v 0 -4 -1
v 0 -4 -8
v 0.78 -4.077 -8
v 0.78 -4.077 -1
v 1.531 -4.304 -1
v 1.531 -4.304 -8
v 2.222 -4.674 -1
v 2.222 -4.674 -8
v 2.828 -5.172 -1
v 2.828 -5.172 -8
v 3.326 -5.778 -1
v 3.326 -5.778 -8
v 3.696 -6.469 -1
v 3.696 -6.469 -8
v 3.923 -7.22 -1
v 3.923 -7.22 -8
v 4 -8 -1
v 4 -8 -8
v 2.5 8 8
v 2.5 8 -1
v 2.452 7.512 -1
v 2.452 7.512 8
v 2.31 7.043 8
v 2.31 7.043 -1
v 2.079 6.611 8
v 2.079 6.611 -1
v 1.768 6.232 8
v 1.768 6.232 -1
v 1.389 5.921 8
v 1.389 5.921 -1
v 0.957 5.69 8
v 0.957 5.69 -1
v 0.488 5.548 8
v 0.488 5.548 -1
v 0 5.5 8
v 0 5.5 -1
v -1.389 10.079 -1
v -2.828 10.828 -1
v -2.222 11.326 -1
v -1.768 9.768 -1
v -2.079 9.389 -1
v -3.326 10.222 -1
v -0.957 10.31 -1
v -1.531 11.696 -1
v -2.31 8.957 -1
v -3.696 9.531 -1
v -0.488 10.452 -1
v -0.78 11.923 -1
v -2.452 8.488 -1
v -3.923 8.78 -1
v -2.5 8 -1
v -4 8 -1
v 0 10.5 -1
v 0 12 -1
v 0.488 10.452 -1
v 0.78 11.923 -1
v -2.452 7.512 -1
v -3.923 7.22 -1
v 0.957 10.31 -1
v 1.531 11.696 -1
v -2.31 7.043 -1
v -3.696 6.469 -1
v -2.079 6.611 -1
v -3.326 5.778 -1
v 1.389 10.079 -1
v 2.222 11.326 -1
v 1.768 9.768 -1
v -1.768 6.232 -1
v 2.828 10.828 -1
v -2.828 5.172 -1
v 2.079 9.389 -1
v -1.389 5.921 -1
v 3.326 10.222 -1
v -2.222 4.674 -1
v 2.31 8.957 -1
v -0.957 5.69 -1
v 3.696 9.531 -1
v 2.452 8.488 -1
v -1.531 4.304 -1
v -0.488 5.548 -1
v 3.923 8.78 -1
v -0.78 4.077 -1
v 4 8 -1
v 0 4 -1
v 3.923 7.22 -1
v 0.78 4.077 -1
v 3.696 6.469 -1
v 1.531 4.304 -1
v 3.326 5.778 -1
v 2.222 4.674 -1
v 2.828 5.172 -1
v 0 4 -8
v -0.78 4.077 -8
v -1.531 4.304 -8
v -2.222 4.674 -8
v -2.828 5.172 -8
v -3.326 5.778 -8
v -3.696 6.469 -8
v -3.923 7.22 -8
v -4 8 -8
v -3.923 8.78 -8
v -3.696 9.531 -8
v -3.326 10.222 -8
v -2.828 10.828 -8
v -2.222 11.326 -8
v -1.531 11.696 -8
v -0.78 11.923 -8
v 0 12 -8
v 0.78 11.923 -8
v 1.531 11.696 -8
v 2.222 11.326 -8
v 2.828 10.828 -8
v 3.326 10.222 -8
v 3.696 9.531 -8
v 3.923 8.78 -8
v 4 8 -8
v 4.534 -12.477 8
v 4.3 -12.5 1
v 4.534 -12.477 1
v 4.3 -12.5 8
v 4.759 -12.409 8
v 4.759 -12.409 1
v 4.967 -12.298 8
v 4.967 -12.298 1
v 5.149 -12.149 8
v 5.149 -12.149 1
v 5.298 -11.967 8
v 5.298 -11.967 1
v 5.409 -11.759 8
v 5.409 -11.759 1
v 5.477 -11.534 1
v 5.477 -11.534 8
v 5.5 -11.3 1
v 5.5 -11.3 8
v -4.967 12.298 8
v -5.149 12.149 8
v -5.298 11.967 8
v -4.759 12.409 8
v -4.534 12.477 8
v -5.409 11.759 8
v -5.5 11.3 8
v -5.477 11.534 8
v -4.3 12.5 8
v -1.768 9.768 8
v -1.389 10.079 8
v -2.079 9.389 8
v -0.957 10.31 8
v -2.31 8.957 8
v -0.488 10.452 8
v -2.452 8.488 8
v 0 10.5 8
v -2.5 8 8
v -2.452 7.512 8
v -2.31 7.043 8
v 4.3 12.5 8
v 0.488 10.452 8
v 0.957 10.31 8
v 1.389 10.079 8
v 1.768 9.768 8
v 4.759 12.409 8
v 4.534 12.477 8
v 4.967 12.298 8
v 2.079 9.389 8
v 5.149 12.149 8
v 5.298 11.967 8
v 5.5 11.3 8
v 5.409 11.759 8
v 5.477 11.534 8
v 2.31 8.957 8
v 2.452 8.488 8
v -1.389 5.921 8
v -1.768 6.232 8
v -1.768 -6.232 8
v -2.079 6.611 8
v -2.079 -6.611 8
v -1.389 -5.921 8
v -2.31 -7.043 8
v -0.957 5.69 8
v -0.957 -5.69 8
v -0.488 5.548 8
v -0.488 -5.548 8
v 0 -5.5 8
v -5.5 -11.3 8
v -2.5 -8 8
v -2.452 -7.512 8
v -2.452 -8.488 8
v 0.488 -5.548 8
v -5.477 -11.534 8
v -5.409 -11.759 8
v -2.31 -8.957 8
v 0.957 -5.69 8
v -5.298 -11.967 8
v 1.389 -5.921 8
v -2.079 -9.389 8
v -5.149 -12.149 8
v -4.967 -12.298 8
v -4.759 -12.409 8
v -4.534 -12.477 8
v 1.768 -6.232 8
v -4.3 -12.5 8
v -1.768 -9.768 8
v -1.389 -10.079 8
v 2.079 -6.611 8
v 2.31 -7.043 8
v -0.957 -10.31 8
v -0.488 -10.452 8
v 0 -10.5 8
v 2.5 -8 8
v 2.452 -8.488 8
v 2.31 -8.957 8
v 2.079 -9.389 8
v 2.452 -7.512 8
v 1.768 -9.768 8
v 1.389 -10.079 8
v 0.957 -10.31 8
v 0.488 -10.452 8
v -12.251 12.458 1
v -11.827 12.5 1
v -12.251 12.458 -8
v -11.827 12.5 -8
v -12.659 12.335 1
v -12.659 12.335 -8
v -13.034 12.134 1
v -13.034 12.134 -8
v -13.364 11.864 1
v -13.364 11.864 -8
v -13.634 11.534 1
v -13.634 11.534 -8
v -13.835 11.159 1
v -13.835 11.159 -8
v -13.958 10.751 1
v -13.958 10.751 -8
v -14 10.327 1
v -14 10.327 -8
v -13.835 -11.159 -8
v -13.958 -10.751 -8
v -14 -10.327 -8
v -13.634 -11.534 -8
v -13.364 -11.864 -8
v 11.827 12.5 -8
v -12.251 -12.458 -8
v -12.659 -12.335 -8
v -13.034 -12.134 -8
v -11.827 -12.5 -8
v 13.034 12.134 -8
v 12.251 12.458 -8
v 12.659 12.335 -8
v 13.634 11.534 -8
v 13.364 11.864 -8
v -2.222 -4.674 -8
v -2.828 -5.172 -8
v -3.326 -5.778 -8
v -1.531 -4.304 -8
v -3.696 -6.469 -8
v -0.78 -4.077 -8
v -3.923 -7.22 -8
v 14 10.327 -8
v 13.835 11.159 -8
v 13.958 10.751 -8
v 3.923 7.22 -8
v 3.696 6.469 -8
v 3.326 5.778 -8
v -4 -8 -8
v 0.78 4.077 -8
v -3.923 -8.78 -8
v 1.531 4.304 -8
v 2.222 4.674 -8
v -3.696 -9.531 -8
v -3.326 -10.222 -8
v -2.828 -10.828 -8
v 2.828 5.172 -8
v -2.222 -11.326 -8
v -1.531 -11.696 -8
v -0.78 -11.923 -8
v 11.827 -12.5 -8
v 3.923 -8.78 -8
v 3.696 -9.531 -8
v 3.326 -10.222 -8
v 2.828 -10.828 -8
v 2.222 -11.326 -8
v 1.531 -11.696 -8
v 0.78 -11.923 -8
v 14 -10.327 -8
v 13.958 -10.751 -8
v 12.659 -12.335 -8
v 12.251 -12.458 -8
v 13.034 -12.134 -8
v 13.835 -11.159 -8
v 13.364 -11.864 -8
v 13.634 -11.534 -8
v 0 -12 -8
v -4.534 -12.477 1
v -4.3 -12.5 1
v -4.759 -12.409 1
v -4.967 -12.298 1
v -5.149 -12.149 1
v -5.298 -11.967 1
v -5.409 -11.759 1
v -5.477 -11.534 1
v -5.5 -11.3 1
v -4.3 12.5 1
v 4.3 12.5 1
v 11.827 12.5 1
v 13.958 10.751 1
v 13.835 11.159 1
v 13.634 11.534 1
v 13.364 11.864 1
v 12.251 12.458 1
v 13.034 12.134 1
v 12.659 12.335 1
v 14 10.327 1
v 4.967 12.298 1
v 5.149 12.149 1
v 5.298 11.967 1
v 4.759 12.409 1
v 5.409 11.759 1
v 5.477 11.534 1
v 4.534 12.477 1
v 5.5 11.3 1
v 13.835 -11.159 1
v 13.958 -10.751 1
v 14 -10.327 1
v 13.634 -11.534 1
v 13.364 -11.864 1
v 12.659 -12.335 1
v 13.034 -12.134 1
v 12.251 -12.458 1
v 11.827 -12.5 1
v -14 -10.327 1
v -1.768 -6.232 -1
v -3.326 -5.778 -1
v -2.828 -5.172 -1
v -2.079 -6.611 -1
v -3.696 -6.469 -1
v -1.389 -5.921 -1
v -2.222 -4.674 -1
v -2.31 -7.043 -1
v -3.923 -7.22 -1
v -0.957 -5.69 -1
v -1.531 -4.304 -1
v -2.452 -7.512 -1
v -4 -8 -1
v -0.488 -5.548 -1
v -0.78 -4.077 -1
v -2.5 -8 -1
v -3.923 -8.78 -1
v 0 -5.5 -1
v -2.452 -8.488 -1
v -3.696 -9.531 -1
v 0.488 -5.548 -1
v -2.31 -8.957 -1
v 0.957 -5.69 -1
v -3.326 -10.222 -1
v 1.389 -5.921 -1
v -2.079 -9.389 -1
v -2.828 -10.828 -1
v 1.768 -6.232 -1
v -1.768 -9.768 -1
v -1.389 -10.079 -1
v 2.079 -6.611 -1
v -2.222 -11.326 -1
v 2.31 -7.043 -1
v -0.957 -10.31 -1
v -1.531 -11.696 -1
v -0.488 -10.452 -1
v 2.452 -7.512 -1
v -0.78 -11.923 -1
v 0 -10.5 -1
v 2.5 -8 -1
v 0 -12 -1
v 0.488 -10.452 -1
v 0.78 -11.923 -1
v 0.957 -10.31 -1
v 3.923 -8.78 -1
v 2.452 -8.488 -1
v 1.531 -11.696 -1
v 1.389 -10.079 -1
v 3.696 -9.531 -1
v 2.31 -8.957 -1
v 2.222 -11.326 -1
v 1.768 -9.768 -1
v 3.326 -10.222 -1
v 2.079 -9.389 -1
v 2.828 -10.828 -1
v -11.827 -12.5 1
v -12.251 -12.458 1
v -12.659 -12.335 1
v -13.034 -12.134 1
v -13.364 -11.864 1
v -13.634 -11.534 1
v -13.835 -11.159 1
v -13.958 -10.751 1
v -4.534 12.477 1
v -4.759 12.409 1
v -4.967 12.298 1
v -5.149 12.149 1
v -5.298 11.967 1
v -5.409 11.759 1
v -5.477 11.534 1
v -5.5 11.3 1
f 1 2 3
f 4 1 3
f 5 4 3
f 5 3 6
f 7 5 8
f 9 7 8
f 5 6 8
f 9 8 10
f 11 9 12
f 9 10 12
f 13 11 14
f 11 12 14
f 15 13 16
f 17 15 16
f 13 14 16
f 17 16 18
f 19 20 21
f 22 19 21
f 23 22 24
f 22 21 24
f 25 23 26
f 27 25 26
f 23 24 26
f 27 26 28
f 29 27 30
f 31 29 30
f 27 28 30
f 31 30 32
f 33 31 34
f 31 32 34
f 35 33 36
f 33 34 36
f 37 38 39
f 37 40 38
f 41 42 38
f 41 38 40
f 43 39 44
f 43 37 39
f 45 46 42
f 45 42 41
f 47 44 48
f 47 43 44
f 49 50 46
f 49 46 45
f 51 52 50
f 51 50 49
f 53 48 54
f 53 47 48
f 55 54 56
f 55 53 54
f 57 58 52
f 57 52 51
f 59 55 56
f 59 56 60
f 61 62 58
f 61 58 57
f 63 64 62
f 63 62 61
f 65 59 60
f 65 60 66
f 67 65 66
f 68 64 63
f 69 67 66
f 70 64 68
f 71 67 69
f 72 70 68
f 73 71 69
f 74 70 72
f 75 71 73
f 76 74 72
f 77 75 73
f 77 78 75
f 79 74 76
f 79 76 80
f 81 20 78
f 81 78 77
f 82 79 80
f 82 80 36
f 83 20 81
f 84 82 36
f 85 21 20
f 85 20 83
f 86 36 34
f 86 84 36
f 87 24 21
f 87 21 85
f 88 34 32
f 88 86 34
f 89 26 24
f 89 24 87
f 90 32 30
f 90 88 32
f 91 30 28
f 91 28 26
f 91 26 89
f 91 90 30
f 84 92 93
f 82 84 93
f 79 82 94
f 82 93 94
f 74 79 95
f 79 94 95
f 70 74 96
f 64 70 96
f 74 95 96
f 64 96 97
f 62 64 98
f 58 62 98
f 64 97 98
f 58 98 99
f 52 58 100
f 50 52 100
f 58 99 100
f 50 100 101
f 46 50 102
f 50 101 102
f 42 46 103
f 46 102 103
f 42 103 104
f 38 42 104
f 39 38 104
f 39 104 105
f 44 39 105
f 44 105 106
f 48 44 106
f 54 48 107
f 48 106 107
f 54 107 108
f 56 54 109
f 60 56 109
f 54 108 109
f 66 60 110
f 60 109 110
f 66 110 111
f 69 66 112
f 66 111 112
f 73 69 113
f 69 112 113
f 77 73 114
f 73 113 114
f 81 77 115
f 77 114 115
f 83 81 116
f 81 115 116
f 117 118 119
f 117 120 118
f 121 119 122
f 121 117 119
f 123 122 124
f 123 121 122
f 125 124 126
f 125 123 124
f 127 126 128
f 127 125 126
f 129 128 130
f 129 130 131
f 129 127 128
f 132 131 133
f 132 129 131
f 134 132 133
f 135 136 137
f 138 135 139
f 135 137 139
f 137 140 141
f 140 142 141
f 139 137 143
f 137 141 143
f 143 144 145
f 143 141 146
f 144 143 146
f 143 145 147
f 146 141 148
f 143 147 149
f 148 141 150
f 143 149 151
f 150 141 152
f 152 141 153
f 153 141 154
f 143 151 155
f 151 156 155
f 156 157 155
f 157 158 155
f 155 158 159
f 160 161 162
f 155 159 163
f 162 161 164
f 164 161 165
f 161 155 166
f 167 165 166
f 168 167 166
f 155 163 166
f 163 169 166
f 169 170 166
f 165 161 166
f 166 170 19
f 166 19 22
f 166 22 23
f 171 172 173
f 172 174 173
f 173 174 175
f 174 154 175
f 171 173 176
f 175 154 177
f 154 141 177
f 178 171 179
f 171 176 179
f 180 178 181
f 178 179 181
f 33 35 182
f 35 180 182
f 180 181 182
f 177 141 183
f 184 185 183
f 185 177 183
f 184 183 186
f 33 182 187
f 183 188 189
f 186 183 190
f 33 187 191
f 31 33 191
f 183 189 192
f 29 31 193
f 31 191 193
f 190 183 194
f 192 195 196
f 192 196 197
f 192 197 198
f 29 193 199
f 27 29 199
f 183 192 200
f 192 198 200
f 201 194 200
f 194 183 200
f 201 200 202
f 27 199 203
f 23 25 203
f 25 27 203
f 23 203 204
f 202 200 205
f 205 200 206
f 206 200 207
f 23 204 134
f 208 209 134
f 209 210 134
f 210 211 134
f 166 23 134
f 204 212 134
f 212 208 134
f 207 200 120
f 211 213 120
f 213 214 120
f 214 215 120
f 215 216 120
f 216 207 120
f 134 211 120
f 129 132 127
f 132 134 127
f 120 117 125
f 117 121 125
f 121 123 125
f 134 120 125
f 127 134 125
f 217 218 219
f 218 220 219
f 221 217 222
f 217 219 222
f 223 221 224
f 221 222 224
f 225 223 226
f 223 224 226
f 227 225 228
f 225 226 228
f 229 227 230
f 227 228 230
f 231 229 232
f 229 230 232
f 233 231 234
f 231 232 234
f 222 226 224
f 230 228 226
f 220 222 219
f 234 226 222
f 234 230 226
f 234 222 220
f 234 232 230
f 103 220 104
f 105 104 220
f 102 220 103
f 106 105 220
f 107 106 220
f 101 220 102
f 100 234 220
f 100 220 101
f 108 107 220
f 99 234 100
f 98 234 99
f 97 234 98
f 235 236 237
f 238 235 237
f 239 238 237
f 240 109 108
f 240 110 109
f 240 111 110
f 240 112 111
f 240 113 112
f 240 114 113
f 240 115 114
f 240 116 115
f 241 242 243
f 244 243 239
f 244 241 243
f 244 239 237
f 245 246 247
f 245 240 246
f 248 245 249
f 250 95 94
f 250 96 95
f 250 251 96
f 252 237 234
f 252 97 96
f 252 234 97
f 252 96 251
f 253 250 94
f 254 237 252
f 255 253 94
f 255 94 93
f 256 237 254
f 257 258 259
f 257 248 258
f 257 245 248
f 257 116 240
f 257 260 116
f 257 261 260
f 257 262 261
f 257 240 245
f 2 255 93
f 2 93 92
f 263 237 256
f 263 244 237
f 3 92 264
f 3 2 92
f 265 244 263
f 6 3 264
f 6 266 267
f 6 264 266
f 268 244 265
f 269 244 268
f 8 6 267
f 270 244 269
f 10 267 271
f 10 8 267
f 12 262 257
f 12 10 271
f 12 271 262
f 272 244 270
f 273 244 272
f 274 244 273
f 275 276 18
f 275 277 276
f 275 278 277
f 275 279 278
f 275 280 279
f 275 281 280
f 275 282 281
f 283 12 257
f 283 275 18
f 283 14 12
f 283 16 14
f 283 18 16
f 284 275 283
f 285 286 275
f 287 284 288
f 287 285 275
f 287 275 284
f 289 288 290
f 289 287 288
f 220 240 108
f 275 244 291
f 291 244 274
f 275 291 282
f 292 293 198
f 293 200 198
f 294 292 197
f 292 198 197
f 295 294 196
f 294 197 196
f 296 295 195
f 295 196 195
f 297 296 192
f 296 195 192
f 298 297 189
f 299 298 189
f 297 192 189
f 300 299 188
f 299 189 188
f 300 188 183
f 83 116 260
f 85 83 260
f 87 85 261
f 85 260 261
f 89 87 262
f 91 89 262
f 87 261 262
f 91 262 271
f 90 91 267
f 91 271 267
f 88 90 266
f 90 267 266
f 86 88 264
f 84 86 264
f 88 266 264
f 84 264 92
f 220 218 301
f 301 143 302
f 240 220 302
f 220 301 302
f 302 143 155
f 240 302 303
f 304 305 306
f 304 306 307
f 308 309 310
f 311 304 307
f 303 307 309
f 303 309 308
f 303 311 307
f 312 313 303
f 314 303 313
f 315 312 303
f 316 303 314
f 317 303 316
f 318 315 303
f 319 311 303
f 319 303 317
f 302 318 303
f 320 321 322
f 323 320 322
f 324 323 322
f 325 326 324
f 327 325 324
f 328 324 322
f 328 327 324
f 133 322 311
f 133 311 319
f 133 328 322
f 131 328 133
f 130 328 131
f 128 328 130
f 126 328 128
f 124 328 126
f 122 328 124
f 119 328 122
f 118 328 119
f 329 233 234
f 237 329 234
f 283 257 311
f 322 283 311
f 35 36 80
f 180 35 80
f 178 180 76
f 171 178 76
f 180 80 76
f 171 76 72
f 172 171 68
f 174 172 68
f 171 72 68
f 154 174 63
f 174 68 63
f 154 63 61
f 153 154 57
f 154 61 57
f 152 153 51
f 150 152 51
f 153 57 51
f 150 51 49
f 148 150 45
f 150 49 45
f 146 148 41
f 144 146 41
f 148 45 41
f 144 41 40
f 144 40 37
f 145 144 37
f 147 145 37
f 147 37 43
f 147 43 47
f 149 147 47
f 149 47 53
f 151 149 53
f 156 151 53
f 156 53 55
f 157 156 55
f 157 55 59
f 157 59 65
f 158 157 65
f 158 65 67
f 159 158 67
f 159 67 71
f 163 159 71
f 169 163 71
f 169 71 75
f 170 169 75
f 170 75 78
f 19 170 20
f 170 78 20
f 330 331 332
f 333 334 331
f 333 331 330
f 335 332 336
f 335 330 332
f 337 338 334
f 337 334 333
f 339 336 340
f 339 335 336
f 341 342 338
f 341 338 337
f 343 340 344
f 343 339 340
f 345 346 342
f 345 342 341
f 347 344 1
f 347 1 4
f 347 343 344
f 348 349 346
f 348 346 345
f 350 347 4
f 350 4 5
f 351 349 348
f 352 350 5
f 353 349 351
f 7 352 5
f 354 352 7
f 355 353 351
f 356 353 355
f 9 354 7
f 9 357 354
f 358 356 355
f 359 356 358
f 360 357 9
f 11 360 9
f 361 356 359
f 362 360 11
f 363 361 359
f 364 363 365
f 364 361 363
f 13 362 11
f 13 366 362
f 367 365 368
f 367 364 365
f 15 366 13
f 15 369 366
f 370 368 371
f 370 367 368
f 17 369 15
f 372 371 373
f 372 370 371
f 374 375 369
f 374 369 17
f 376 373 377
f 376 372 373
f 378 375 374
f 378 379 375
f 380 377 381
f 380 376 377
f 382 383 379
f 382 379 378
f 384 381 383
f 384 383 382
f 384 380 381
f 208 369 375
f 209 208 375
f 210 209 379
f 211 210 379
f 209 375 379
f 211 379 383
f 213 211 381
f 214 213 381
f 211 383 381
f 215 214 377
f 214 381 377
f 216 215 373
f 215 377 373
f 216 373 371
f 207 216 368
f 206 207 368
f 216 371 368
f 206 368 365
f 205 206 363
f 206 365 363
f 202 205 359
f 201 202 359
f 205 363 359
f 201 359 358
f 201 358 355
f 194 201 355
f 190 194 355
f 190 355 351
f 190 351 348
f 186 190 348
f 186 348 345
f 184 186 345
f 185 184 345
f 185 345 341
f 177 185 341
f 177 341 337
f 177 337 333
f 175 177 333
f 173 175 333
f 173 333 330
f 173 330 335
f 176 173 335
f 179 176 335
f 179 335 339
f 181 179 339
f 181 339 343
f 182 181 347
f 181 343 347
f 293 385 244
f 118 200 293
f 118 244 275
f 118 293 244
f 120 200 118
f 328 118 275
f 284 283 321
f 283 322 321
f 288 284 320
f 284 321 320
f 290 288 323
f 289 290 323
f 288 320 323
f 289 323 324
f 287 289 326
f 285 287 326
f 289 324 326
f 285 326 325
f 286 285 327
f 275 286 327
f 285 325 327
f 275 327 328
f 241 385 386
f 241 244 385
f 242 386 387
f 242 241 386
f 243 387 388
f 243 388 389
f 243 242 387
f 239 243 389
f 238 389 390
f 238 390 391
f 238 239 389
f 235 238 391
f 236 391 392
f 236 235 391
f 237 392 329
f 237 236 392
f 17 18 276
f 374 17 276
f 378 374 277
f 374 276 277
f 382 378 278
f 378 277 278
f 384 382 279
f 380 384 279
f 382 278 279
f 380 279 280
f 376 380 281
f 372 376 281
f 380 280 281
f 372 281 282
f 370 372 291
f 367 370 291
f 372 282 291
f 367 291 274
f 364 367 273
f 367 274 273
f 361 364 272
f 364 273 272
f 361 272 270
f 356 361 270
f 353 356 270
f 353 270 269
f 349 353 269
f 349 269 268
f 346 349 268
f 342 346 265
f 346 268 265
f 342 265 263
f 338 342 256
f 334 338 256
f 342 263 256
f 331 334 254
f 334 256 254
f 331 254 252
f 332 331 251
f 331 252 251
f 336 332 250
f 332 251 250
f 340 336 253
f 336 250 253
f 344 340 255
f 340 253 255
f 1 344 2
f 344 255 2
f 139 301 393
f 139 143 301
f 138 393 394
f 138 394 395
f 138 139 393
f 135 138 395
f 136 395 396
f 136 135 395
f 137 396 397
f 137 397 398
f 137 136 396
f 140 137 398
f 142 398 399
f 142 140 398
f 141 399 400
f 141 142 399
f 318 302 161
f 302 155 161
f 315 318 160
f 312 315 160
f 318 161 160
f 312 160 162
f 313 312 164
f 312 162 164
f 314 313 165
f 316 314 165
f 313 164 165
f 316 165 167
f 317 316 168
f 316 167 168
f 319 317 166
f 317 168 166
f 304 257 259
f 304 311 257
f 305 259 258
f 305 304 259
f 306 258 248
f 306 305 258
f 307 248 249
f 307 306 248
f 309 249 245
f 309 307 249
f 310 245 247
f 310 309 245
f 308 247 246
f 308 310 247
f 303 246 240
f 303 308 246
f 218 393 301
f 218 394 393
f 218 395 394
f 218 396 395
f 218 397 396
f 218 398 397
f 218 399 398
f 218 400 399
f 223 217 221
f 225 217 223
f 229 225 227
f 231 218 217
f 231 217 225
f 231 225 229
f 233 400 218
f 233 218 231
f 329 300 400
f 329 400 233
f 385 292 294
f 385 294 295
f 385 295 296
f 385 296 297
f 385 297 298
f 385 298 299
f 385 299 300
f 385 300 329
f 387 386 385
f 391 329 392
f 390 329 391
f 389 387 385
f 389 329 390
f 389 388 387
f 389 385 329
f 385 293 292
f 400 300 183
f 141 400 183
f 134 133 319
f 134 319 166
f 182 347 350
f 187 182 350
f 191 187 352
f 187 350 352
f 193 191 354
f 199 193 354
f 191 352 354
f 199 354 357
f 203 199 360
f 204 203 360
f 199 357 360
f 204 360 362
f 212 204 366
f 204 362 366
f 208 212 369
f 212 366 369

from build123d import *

# Parameters (mm, degrees)
F0_W     = 11
F0_H     = 7
F1_DEPTH = 12.5
F3_DEPTH = 25
F4_DEPTH = 7
F5_R     = 2.172792
F6_R     = 1.2


with BuildPart() as f1:
    # F0 (on Front) → F1 (new body, symmetric)
    with BuildSketch(Plane.XZ):
        Polygon((14, -8), (14, 1), (5.5, 1), (-5.5, 1), (-14, 1), (-14, -8), align=None)
        with Locations((0, 4.5)):
            Rectangle(F0_W, F0_H)
    extrude(amount=F1_DEPTH, both=True)

    # F2 (on face) → F3 (cut)
    with BuildSketch(Plane(origin=(0, 0, -8), x_dir=(1, 0, 0), z_dir=(0, 0, -1))):
        with BuildLine():
            ThreePointArc((2.5, 8), (-1.767767, 9.767767), (0, 5.5))
            ThreePointArc((0, 5.5), (1.767767, 6.232233), (2.5, 8))
        make_face()
        with BuildLine():
            ThreePointArc((2.5, -8), (1.767767, -6.232233), (0, -5.5))
            ThreePointArc((0, -5.5), (-1.767767, -9.767767), (2.5, -8))
        make_face()
    extrude(amount=-F3_DEPTH, mode=Mode.SUBTRACT)

    # F2 (on face) → F4 (cut)
    with BuildSketch(Plane(origin=(0, 0, -8), x_dir=(1, 0, 0), z_dir=(0, 0, -1))):
        with BuildLine():
            ThreePointArc((4, 8), (-2.828427, 10.828427), (0, 4))
            ThreePointArc((0, 4), (2.828427, 5.171573), (4, 8))
        make_face()
        with BuildLine():
            ThreePointArc((2.5, 8), (1.767767, 6.232233), (0, 5.5))
            ThreePointArc((0, 5.5), (-1.767767, 9.767767), (2.5, 8))
        make_face(mode=Mode.SUBTRACT)
        with BuildLine():
            ThreePointArc((4, -8), (2.828427, -5.171573), (0, -4))
            ThreePointArc((0, -4), (-2.828427, -10.828427), (4, -8))
        make_face()
        with BuildLine():
            ThreePointArc((2.5, -8), (-1.767767, -9.767767), (0, -5.5))
            ThreePointArc((0, -5.5), (1.767767, -6.232233), (2.5, -8))
        make_face(mode=Mode.SUBTRACT)
    extrude(amount=-F4_DEPTH, mode=Mode.SUBTRACT)

    # F5
    f5_edges = [f1.edges().sort_by_distance(p)[0] for p in [
        (-14, -12.5, -3.5),
        (14, -12.5, -3.5),
        (14, 12.5, -3.5),
        (-14, 12.5, -3.5),
    ]]
    fillet(f5_edges, radius=F5_R)

    # F6
    f6_edges = [f1.edges().sort_by_distance(p)[0] for p in [
        (5.5, -12.5, 4.5),
        (-5.5, -12.5, 4.5),
        (5.5, 12.5, 4.5),
        (-5.5, 12.5, 4.5),
    ]]
    fillet(f6_edges, radius=F6_R)


solid = f1.part
